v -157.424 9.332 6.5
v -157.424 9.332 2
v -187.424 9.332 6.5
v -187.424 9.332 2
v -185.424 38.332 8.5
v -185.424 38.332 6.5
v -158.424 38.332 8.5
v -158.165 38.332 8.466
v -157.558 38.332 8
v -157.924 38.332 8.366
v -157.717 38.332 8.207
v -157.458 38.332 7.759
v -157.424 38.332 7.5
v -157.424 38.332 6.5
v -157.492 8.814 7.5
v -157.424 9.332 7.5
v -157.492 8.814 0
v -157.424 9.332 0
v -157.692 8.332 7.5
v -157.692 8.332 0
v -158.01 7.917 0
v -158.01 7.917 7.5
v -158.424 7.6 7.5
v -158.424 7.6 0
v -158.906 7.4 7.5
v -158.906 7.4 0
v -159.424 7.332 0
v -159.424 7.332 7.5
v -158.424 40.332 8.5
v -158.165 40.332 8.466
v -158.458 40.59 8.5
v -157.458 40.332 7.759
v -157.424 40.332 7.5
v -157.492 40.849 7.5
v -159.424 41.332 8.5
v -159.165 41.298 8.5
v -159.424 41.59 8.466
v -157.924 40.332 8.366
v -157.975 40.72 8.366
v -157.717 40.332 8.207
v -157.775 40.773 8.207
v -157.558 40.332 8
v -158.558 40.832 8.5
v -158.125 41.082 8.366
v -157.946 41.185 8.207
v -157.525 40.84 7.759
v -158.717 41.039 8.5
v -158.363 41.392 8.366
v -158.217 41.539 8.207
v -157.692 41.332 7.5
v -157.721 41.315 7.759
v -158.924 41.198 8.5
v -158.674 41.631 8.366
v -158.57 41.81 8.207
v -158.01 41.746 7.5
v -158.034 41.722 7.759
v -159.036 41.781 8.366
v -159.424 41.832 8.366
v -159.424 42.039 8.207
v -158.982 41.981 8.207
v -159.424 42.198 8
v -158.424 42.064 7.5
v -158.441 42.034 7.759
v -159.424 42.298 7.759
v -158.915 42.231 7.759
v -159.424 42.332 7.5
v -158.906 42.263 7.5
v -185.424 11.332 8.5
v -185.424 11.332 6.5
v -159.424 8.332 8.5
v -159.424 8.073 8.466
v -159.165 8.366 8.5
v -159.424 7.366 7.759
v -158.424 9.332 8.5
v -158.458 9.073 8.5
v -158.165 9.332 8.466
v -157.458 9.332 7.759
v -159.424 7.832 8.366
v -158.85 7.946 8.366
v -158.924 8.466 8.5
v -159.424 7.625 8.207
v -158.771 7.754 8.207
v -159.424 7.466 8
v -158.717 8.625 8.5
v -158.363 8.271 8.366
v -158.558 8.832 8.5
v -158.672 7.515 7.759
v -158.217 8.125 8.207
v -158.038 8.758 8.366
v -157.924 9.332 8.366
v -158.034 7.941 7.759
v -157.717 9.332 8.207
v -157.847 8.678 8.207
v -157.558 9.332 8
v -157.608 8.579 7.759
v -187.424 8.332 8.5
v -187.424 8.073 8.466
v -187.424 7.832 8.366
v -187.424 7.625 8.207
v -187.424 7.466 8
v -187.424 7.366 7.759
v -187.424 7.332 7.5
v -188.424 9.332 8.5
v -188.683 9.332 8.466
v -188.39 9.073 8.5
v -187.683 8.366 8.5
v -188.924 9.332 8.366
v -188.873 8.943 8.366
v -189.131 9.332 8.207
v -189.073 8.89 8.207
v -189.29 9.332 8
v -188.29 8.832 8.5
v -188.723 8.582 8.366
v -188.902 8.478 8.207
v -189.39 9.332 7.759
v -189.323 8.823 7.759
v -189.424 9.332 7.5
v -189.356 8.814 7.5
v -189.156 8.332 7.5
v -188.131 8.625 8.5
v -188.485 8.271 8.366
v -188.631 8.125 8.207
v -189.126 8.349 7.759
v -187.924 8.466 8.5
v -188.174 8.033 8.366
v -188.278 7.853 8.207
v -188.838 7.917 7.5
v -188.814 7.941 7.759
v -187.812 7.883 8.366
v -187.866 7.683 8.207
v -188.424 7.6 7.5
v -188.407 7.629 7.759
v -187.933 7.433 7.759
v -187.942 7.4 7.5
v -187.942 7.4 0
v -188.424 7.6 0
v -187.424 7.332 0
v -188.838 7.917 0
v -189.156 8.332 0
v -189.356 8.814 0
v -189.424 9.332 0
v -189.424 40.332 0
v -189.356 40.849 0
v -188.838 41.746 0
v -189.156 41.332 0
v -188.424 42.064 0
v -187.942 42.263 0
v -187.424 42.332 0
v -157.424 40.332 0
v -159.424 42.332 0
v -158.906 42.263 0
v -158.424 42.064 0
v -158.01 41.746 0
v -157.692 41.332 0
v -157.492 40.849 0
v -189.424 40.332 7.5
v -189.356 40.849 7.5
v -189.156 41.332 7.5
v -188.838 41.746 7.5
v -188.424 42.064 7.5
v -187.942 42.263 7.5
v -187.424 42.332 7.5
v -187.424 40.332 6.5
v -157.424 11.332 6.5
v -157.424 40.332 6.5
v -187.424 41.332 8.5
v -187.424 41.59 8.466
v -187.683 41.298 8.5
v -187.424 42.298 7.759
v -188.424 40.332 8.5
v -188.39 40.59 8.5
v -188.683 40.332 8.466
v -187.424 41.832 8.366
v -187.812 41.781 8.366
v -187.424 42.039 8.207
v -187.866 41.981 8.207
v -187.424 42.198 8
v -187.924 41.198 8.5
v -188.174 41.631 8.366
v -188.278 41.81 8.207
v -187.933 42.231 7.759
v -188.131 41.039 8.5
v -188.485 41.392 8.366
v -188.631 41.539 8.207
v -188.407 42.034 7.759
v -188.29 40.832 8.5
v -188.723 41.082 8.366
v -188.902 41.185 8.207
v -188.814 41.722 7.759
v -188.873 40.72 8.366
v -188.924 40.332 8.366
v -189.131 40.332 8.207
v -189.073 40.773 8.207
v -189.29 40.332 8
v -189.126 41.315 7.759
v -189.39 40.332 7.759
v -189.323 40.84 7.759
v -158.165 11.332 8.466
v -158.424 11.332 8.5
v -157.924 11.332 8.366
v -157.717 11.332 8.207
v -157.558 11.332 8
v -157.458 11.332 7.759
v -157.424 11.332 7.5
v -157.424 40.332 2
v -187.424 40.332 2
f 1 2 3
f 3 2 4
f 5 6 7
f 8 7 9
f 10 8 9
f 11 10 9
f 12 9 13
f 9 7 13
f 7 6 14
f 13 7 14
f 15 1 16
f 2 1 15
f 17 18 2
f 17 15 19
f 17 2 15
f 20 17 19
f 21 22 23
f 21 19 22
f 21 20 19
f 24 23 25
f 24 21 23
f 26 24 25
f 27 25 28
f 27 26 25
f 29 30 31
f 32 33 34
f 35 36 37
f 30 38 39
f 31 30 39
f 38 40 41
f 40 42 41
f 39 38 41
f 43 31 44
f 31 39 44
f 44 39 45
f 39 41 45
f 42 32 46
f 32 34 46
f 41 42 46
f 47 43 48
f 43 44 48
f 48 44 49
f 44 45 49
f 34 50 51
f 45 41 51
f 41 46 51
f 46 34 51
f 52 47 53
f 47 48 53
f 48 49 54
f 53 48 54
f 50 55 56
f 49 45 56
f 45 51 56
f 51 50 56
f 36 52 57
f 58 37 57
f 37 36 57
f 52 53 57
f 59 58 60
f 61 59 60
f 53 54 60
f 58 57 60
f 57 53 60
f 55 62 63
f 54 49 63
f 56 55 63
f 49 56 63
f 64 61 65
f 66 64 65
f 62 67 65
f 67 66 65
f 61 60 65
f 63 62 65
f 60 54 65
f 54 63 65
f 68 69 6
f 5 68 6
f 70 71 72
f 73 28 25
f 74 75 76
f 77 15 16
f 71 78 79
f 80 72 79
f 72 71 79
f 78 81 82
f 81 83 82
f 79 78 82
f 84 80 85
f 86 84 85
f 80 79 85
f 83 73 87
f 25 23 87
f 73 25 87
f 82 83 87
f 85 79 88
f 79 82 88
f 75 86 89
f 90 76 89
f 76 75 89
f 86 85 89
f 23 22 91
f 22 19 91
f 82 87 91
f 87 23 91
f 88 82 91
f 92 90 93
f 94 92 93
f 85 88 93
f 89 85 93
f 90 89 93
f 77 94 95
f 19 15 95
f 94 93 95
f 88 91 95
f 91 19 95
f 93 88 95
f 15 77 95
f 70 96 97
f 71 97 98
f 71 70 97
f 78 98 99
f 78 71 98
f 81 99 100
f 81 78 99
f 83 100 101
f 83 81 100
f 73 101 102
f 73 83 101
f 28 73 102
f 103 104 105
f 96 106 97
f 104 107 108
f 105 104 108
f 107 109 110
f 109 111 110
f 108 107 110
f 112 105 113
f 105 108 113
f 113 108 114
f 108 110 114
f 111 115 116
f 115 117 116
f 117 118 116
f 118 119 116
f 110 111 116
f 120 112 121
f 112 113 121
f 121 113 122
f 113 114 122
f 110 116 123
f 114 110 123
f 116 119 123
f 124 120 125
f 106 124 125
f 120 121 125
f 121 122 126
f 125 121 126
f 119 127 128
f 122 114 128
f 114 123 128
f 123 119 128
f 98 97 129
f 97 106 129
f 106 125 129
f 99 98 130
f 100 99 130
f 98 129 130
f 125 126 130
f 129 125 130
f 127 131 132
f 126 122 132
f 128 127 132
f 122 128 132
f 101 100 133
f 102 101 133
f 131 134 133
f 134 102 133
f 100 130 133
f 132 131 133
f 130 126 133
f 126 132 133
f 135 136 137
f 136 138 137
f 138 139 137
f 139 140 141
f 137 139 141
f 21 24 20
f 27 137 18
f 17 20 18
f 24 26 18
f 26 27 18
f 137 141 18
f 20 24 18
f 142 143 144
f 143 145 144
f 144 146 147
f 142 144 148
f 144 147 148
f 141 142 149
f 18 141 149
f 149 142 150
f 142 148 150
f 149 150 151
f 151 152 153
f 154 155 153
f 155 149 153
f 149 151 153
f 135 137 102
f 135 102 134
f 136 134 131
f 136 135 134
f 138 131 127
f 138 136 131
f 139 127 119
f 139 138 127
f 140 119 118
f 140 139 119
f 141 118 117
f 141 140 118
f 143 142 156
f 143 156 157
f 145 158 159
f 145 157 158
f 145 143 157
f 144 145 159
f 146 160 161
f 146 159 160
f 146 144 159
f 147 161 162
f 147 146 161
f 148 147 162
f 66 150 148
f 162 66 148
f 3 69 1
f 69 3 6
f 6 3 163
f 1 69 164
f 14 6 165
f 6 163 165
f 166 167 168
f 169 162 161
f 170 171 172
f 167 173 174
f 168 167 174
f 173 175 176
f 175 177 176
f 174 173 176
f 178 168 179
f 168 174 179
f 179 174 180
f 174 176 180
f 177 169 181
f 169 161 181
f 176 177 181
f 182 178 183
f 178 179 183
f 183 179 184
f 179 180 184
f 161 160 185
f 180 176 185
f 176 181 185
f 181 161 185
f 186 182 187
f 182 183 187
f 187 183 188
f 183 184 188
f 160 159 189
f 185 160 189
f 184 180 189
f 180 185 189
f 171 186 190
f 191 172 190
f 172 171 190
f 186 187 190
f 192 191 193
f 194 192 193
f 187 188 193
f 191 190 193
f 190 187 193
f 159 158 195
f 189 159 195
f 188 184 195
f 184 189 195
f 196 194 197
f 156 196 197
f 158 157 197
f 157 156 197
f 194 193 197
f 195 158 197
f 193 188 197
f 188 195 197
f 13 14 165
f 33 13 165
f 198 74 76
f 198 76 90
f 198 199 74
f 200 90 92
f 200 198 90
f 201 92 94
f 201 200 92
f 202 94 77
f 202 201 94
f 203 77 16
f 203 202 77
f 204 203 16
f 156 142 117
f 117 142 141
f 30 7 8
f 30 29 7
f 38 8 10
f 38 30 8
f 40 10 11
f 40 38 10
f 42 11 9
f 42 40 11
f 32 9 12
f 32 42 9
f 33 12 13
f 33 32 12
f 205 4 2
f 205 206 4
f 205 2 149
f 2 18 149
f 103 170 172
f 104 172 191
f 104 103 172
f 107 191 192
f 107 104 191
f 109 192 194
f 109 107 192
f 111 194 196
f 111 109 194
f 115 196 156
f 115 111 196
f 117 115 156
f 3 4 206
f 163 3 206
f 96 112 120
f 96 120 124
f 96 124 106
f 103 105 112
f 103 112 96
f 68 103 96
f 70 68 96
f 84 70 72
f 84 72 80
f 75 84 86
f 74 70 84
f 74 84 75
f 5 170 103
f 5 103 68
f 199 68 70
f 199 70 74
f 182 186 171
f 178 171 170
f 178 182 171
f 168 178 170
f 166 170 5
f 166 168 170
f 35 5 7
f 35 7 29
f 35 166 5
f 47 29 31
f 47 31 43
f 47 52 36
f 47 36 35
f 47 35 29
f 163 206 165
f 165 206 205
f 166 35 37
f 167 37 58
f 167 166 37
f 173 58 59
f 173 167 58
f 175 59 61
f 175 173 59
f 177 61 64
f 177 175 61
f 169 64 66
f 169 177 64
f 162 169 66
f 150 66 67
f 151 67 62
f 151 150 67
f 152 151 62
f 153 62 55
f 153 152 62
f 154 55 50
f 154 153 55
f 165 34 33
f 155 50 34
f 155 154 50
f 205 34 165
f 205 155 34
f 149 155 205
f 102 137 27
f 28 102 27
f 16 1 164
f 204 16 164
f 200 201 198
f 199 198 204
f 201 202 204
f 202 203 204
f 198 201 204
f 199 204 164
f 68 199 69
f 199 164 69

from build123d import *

# Parameters (mm, degrees)
SKETCH1_W           = 32
SKETCH1_H           = 35
BOSS_EXTRUDE1_DEPTH = 2
BOSS_EXTRUDE2_DEPTH = 4.5
BOSS_EXTRUDE3_DEPTH = 2
FILLET1_START       = -1
FILLET1_DEPTH       = 10
FILLET2_R           = 1


with BuildPart() as part:
    # Sketch1 → Boss-Extrude1 (new body)
    with BuildSketch(Plane.XY):
        with Locations((-173.423957437, 24.831611866)):
            Rectangle(SKETCH1_W, SKETCH1_H)
    extrude(amount=BOSS_EXTRUDE1_DEPTH)

    # Sketch2 → Boss-Extrude2 (add)
    with BuildSketch(Plane.XY.offset(2)):
        Polygon((-157.423957437, 42.331611866), (-189.423957437, 42.331611866), (-189.423957437, 7.331611866), (-157.423957437, 7.331611866), (-157.423957437, 9.331611866), (-187.423957437, 9.331611866), (-187.423957437, 40.331611866), (-157.423957437, 40.331611866), align=None)
    extrude(amount=BOSS_EXTRUDE2_DEPTH)

    # Sketch3 → Boss-Extrude3 (add)
    with BuildSketch(Plane.XY.offset(6.5)):
        Polygon((-157.423957437, 42.331611866), (-189.423957437, 42.331611866), (-189.423957437, 7.331611866), (-157.423957437, 7.331611866), (-157.423957437, 11.331611866), (-185.423957437, 11.331611866), (-185.423957437, 38.331611866), (-157.423957437, 38.331611866), align=None)
    extrude(amount=BOSS_EXTRUDE3_DEPTH)

    # Fillet1: read off the stored shape, not the designer's step
    # Fillet1 outline → Fillet1 (cut)
    with BuildSketch(Plane.XY.offset(FILLET1_START)):
        with BuildLine():
            Line((-157.423957437, 42.331611866), (-159.423957437, 42.331611866))
            ThreePointArc((-159.423957437, 42.331611866), (-158.009743875, 41.745825428), (-157.423957437, 40.331611866))
            Line((-157.423957437, 40.331611866), (-157.423957437, 42.331611866))
        make_face()
        with BuildLine():
            ThreePointArc((-189.423957437, 40.331611866), (-188.838170999, 41.745825428), (-187.423957437, 42.331611866))
            Line((-187.423957437, 42.331611866), (-189.423957437, 42.331611866))
            Line((-189.423957437, 42.331611866), (-189.423957437, 40.331611866))
        make_face()
        with BuildLine():
            ThreePointArc((-187.423957437, 7.331611866), (-188.838170999, 7.917398304), (-189.423957437, 9.331611866))
            Line((-189.423957437, 9.331611866), (-189.423957437, 7.331611866))
            Line((-189.423957437, 7.331611866), (-187.423957437, 7.331611866))
        make_face()
        with BuildLine():
            Line((-157.423957437, 7.331611866), (-157.423957437, 9.331611866))
            ThreePointArc((-157.423957437, 9.331611866), (-158.009743875, 7.917398303), (-159.423957437, 7.331611866))
            Line((-159.423957437, 7.331611866), (-157.423957437, 7.331611866))
        make_face()
    extrude(amount=FILLET1_DEPTH, mode=Mode.SUBTRACT)

    # Fillet2
    fillet2_edges = [part.edges().sort_by_distance(p)[0] for p in [
        (-157.423957437, 10.331611866, 8.5),
        (-158.009743875, 41.745825428, 8.5),
        (-173.423957437, 42.331611866, 8.5),
        (-188.838170999, 41.745825428, 8.5),
        (-158.009743875, 7.917398303, 8.5),
        (-173.423957437, 7.331611866, 8.5),
        (-188.838170999, 7.917398304, 8.5),
        (-189.423957437, 24.831611866, 8.5),
    ]]
    fillet(fillet2_edges, radius=FILLET2_R)


solid = part.part
